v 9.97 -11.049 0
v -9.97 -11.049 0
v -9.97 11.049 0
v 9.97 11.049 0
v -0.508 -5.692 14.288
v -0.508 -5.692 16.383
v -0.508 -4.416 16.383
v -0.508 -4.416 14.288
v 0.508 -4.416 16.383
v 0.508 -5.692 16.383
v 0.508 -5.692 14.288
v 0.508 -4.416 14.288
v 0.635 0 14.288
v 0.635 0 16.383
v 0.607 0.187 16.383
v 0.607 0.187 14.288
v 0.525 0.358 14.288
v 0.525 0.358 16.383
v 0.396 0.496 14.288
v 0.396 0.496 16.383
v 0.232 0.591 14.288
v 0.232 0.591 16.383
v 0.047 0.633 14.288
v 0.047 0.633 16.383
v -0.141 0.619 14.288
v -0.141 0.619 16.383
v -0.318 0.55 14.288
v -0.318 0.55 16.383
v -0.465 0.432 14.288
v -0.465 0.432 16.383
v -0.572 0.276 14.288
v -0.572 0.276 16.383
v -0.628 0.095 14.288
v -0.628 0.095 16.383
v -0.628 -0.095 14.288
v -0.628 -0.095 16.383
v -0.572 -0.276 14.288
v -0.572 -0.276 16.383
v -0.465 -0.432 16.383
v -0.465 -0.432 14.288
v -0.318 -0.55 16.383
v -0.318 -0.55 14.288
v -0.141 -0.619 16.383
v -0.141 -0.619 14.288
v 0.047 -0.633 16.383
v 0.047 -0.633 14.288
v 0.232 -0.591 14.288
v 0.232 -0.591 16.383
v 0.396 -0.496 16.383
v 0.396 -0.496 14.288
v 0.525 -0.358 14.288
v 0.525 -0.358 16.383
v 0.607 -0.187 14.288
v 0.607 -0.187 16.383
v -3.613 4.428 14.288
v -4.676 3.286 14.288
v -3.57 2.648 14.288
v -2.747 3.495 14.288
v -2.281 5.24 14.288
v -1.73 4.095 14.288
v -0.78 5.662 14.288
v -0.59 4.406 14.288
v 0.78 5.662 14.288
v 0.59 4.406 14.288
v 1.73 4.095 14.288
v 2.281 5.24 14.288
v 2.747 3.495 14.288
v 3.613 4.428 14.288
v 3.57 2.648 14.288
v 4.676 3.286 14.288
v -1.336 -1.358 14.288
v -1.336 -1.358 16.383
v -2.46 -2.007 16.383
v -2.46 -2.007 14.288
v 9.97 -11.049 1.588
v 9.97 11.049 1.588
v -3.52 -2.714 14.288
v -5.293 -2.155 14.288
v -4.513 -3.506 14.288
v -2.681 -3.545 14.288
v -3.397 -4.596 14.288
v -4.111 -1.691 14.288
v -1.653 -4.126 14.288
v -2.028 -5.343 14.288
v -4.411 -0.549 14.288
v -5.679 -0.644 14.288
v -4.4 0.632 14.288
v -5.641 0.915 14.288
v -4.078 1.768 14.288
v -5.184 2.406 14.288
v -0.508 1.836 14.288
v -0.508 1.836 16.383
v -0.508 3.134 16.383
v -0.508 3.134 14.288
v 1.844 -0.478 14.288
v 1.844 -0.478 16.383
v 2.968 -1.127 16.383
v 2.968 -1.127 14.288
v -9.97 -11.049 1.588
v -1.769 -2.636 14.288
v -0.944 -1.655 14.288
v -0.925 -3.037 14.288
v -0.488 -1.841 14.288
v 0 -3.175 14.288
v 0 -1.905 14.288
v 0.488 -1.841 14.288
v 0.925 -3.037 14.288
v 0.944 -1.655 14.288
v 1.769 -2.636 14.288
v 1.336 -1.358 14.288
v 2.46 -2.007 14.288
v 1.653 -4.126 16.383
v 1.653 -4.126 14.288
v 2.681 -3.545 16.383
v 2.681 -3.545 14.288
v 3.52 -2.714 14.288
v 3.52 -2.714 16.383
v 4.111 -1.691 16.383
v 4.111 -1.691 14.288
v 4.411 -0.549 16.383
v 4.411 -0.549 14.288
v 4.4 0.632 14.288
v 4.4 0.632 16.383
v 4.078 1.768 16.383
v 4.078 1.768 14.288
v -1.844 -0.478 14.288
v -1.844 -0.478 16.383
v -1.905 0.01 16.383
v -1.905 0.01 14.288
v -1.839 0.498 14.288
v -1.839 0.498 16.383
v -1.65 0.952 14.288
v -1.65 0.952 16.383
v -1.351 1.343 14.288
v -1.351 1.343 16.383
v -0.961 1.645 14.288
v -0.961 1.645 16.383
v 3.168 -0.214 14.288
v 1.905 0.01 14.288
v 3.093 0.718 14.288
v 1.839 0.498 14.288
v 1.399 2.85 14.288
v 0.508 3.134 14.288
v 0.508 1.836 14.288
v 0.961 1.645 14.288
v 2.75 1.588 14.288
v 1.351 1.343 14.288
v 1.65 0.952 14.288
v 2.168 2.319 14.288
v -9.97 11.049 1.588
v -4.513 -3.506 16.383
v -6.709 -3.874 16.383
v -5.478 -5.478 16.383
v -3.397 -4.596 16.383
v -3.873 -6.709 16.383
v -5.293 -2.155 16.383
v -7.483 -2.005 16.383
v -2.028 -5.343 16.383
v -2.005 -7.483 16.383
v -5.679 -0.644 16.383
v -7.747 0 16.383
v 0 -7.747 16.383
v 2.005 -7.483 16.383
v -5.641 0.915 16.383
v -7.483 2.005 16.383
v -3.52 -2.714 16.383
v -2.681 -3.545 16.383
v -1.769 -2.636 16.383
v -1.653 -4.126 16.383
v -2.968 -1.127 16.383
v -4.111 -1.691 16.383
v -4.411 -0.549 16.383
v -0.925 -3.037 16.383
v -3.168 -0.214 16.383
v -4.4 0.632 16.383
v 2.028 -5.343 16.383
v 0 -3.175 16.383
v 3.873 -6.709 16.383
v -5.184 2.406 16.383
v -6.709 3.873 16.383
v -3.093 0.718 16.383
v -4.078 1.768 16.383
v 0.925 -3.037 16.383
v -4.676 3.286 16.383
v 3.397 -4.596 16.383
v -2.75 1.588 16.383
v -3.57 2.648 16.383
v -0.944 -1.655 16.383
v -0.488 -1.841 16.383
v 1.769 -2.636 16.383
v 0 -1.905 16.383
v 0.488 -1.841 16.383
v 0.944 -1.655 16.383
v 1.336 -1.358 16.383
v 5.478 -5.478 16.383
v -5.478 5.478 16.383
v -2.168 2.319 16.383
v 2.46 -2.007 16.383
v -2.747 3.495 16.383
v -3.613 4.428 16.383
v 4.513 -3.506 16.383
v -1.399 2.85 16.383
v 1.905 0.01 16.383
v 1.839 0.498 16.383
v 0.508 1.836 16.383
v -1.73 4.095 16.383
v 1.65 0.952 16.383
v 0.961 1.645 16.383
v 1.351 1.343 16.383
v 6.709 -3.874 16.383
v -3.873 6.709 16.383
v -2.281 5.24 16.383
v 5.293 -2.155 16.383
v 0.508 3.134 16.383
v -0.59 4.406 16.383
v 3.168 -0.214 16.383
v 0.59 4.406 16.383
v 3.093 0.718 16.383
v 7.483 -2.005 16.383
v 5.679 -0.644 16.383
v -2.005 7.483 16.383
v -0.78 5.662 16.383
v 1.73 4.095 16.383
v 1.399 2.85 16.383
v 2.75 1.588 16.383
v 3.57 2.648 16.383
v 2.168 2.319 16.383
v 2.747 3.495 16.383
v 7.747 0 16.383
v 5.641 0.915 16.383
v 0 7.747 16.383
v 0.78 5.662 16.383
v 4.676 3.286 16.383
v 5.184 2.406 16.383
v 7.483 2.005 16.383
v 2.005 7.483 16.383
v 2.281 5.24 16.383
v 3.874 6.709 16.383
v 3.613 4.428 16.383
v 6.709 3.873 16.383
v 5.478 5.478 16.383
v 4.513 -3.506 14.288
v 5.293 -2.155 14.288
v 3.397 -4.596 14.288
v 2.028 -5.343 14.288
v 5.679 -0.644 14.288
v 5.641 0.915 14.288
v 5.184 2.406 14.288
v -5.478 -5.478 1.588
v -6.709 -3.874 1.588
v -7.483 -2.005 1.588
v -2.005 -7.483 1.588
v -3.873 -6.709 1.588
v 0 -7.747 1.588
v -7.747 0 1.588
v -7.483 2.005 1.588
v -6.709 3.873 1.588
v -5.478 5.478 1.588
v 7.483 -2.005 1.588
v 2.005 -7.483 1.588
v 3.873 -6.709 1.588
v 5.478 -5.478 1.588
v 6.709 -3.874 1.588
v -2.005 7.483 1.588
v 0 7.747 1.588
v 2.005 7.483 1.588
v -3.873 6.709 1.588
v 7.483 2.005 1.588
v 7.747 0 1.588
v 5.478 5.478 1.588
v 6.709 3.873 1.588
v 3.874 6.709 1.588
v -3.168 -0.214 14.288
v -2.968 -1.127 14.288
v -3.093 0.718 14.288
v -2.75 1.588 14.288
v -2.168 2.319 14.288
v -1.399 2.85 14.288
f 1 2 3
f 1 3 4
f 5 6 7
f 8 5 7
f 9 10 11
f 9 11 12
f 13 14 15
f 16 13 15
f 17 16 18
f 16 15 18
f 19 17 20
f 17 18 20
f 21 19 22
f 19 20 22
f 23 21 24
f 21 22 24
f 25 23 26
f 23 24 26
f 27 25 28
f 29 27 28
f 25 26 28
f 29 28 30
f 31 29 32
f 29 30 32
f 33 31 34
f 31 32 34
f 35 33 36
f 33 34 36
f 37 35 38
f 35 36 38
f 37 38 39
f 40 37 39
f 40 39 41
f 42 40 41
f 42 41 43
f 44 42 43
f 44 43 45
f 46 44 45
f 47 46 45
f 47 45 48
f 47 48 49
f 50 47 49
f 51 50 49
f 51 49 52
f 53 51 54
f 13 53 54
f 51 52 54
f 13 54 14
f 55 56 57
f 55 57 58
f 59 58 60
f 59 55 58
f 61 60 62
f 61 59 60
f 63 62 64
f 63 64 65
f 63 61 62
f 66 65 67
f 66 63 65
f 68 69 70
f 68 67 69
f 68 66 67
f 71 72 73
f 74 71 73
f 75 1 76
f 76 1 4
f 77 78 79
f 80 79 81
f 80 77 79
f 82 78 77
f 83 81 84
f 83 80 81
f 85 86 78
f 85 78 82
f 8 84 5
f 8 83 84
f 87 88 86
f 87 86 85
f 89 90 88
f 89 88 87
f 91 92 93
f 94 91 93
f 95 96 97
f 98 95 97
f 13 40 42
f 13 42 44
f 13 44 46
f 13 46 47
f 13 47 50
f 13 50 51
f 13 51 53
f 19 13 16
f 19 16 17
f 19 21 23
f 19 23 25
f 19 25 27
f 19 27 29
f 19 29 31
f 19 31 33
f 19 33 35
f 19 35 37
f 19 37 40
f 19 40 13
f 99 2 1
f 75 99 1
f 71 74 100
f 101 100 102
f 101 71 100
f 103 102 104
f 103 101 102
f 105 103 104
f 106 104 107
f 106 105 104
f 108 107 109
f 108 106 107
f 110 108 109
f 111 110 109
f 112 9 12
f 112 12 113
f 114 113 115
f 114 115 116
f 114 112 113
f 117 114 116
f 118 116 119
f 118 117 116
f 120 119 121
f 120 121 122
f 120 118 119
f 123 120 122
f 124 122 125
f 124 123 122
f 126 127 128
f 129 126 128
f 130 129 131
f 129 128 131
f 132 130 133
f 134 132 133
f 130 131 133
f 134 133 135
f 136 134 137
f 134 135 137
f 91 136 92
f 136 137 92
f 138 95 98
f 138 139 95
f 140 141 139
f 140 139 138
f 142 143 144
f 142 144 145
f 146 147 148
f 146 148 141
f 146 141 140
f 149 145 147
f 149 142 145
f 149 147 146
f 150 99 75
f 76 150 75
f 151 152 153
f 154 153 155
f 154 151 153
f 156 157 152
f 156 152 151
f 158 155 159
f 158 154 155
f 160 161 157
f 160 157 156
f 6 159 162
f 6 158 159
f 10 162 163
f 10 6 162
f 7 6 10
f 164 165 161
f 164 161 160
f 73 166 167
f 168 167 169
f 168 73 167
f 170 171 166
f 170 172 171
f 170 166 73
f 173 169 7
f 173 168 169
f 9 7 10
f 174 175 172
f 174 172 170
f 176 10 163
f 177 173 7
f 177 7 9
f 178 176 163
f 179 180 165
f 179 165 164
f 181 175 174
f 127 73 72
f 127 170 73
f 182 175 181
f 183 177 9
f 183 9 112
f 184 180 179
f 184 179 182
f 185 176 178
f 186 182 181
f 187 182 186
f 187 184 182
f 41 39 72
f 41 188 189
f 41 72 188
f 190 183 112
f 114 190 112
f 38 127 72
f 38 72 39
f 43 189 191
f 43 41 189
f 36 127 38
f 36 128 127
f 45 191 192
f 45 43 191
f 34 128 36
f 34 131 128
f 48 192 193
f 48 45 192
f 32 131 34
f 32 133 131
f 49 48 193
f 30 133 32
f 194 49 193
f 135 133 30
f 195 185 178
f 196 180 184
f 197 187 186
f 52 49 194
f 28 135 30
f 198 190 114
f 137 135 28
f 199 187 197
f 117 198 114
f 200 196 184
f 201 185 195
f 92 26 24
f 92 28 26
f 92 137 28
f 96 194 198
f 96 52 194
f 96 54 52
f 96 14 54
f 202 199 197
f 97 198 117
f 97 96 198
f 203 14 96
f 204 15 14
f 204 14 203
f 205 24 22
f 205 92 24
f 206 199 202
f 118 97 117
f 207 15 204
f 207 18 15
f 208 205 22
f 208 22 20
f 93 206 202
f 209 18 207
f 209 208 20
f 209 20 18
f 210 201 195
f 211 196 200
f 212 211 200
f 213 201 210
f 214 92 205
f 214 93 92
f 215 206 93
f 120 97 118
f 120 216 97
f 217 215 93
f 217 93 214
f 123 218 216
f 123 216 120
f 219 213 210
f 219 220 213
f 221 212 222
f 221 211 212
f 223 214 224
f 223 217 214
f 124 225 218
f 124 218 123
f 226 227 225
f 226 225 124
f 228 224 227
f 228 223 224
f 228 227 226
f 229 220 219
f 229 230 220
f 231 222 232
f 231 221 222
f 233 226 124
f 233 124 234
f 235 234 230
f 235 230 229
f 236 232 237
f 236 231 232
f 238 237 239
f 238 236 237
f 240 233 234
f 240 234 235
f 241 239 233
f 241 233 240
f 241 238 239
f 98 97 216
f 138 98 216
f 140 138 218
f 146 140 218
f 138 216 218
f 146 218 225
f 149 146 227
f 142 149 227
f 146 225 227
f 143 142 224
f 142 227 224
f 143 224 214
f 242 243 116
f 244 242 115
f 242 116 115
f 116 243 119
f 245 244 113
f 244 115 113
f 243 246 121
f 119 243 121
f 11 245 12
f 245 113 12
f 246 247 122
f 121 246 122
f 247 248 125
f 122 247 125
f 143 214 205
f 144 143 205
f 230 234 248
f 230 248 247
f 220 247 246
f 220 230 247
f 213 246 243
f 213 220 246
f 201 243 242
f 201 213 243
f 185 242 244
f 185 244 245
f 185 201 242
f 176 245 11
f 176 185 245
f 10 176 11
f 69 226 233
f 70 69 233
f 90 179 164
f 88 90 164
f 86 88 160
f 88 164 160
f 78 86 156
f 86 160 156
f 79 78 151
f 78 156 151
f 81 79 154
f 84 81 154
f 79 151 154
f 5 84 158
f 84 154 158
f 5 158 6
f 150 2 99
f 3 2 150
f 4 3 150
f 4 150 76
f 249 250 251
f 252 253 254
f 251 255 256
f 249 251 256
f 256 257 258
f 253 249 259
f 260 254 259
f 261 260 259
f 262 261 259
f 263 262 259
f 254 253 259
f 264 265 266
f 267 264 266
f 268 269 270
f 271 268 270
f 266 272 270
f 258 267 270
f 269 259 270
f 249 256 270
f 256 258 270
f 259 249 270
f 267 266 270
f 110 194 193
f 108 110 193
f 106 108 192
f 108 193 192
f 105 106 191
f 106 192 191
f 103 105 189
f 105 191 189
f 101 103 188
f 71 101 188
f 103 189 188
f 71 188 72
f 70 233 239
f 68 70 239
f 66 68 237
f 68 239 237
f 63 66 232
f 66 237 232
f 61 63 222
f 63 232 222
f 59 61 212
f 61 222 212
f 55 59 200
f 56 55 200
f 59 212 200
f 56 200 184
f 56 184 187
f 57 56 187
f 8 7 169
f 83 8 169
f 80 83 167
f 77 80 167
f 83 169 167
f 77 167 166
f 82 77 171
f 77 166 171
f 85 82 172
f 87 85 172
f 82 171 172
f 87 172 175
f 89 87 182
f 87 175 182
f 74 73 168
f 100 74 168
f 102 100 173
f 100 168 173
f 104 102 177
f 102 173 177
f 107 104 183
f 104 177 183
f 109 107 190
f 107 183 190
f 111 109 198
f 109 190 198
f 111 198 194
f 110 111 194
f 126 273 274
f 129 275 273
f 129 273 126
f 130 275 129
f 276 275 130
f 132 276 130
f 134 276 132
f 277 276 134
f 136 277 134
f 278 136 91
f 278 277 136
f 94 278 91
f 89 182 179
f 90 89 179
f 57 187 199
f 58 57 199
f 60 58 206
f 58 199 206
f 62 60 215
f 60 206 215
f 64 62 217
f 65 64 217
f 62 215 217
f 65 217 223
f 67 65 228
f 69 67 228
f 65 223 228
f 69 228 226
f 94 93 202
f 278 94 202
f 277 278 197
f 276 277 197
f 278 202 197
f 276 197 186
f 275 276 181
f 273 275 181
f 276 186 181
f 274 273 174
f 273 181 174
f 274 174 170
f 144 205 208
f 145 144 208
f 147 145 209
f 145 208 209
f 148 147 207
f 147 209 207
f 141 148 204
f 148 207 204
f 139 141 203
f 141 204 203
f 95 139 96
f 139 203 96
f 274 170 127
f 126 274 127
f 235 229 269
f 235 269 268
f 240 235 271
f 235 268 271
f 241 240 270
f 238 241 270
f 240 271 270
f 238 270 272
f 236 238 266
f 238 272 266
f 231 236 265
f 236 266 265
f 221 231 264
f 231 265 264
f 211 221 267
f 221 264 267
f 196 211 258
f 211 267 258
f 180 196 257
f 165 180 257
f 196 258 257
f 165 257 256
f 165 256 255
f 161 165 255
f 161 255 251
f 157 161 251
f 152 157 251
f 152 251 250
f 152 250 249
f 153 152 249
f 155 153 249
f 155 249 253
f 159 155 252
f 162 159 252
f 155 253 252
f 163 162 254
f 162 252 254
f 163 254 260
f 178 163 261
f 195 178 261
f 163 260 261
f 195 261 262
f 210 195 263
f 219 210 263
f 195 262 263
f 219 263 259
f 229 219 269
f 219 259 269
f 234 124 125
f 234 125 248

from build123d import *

# Parameters (mm, degrees)
SKETCH1_W      = 19.939
SKETCH1_H      = 22.098
EXTRUDE1_DEPTH = 1.5875
SKETCH2_R      = 7.747
EXTRUDE2_DEPTH = 14.7955
SKETCH3_R      = 0.635
EXTRUDE3_DEPTH = 2.0955


with BuildPart() as part:
    # Sketch1 → Extrude1 (new body)
    with BuildSketch(Plane.XY):
        Rectangle(SKETCH1_W, SKETCH1_H)
    extrude(amount=EXTRUDE1_DEPTH)


with BuildPart() as body_2:
    # Sketch2 → Extrude2 (new body)
    with BuildSketch(Plane.XY.offset(1.5875)):
        Circle(SKETCH2_R)
    extrude(amount=EXTRUDE2_DEPTH)

    # Sketch3 → Extrude3 (cut)
    with BuildSketch(Plane.XY.offset(16.383)):
        with BuildLine():
            Line((3.570260811, 2.647878914), (4.675743477, 3.286129629))
            ThreePointArc((4.675743477, 3.286129629), (0, 5.715), (-4.675743477, 3.286129629))
            Line((-4.675743477, 3.286129629), (-3.570260811, 2.647878914))
            ThreePointArc((-3.570260811, 2.647878914), (0, 4.445), (3.570260811, 2.647878914))
        make_face()
        with BuildLine():
            Line((-4.078260811, 1.767997104), (-5.183743477, 2.406247818))
            ThreePointArc((-5.183743477, 2.406247818), (-4.949335183, -2.8575), (-0.508, -5.692377447))
            Line((-0.508, -5.692377447), (-0.508, -4.415876017))
            ThreePointArc((-0.508, -4.415876017), (-3.84948292, -2.2225), (-4.078260811, 1.767997104))
        make_face()
        with BuildLine():
            Line((-0.508, 1.836017701), (-0.508, 3.134096521))
            ThreePointArc((-0.508, 3.134096521), (-2.749630657, 1.5875), (-2.968207205, -1.127107355))
            Line((-2.968207205, -1.127107355), (-1.844037971, -0.478067946))
            ThreePointArc((-1.844037971, -0.478067946), (-1.649778394, 0.9525), (-0.508, 1.836017701))
        make_face()
        with BuildLine():
            Line((-1.336037971, -1.357949756), (-2.460207205, -2.006989165))
            ThreePointArc((-2.460207205, -2.006989165), (0, -3.175), (2.460207205, -2.006989165))
            Line((2.460207205, -2.006989165), (1.336037971, -1.357949756))
            ThreePointArc((1.336037971, -1.357949756), (0, -1.905), (-1.336037971, -1.357949756))
        make_face()
        Circle(SKETCH3_R)
        with BuildLine():
            Line((1.844037971, -0.478067946), (2.968207205, -1.127107355))
            ThreePointArc((2.968207205, -1.127107355), (2.749630657, 1.5875), (0.508, 3.134096521))
            Line((0.508, 3.134096521), (0.508, 1.836017701))
            ThreePointArc((0.508, 1.836017701), (1.649778394, 0.9525), (1.844037971, -0.478067946))
        make_face()
        with BuildLine():
            ThreePointArc((0.508, -4.415876017), (3.84948292, -2.2225), (4.078260811, 1.767997104))
            Line((4.078260811, 1.767997104), (5.183743477, 2.406247818))
            ThreePointArc((5.183743477, 2.406247818), (4.949335183, -2.8575), (0.508, -5.692377447))
            Line((0.508, -5.692377447), (0.508, -4.415876017))
        make_face()
    extrude(amount=-EXTRUDE3_DEPTH, mode=Mode.SUBTRACT)


solid = Compound([part.part, body_2.part])
